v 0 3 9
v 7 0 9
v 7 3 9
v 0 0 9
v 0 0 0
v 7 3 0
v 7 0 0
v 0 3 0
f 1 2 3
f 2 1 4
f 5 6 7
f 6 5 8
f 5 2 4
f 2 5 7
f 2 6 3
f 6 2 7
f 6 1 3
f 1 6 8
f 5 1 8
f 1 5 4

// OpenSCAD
// Generated by SolidPython 1.0.1 on 2020-07-29 00:46:54


cube(size = [7, 3, 9]);
/***********************************************
*********      SolidPython code:      **********
************************************************
 
# import packages: SolidPython
from solid import *
from solid.utils import *
from itertools import chain, combinations, permutations


class Resize:

    def __init__(self, scad_file):
        self.scad_file = scad_file
        #self.scad_file = import_scad(scad_file)
        # cone/cylinder param:
        self.r1 = 0
        self.r2 = 0
        self.h = 0
        # rectangular prism param:
        self.w = 0
        self.l = 0
        # ellipse param:
        self.r = 0

    # import OpenScad code (file name corresponds to shape)


    # classify shape + parameters
    def assign(self, param1, param2, param3):
        if self.scad_file == 'cone.scad':
            self.r1 = param1
            self.r2 = param2
            self.h = param3
        elif self.scad_file == 'cylinder.scad':
            self.r1 = param1
            self.r2 = param2
            self.h = param3
        elif self.scad_file == 'rectangularPrism.scad':
            self.h = param1
            self.l = param2
            self.w = param3
        else:
            self.r = param1
            self.h = param2

    # resize parameters
    def iterate(self):
        x = range(3, 20, 2)
        i = 1
        if self.scad_file == 'cone.scad':
            tempList = list(permutations(x, 2))
            for temp in tempList:
                param1 = temp[0]
                param2 = temp[1]
                filepath = 'produced_scad_files/' + 'cone' + str(param1) + '_' + str(param2) + '_' + '.scad'
                scad_render_to_file(cylinder(h=param1, r1=param2, r2=0), filepath)

        elif self.scad_file == 'cylinder.scad':
            tempList = list(permutations(x, 3))
            for temp in tempList:
                param1 = temp[0]
                param2 = temp[1]
                filepath = 'produced_scad_files/' + 'cylinder' + str(param1) + '_' + str(param2) + '_' + '.scad'
                scad_render_to_file(cylinder(h=param1, r1=param2, r2=param2), filepath)

        elif self.scad_file == 'rectangularPrism.scad':
            tempList = list(permutations(x, 3))
            for temp in tempList:
                param1 = temp[0]
                param2 = temp[1]
                param3 = temp[2]
                filepath = 'produced_scad_files/' + 'rectangularPrism' + str(param1) + '_' + str(param2) + '_' + str(
                    param3) + '.scad'
                scad_render_to_file(cube(size=(param1, param2, param3)), filepath)

        elif self.scad_file == 'ellipse.scad':
            tempList = list(permutations(x, 4))
            for temp in tempList:
                param1 = temp[0]
                param2 = temp[1]
                param3 = temp[2]
                param4 = temp[3]
                filepath = 'produced_scad_files/' + 'ellipse' + str(param1) + '_' + str(param2) + '_' + str(param3) + '_' + str(param4) + '.scad'
                scad_render_to_file(scale([param1, param2, param3])(sphere(r=param4)), filepath)

    def render_to_scadfile(self):
        scad_render_to_file(scad, 'example.scad') 
 
************************************************/
